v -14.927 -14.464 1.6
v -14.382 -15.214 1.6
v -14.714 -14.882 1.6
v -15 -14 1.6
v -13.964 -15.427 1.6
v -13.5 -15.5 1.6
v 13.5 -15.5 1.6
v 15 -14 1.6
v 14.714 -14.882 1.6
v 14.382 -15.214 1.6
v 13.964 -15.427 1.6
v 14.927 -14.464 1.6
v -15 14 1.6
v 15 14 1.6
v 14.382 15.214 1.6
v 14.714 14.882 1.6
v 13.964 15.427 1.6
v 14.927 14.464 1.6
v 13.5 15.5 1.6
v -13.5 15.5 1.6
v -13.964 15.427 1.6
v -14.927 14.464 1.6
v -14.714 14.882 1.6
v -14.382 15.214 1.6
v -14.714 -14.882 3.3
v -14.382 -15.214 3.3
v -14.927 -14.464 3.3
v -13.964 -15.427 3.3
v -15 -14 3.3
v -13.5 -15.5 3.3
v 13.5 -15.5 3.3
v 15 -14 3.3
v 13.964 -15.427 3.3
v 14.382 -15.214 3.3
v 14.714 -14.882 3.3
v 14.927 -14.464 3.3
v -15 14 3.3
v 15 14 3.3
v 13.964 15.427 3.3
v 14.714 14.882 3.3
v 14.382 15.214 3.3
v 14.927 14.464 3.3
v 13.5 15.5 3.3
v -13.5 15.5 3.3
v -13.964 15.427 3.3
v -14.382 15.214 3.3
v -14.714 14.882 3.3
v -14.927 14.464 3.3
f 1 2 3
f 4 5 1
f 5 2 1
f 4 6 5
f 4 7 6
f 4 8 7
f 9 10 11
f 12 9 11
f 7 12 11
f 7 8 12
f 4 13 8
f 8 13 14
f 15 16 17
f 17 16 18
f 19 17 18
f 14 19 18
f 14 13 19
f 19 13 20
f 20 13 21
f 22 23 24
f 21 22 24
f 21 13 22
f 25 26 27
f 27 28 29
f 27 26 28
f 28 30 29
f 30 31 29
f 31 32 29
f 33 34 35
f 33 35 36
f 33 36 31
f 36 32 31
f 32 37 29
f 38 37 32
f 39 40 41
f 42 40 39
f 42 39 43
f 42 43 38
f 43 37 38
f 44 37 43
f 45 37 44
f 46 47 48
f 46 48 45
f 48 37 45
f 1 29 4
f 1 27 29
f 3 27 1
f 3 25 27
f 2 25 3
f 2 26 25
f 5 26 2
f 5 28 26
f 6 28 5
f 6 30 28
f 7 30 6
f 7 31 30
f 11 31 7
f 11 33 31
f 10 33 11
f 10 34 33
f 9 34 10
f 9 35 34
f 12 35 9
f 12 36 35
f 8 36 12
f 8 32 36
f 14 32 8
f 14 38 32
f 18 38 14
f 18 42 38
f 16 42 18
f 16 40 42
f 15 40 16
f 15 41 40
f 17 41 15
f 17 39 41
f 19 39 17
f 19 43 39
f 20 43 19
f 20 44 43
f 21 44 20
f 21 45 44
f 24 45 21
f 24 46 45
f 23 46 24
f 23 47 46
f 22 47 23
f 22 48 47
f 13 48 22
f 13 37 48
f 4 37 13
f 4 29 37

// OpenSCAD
    $fn=20;
    
    baseDims=[30,31,1.7];
    rad=1.5;
    baseThck=1.7;
    baseZOffset=1.6;
    fudge=0.1;
    
    //base
    translate([0,0,baseZOffset]) linear_extrude(baseThck) 
      //difference(){
        hull() for (ix=[-1,1], iy=[-1,1])
          translate([ix*(baseDims.x/2-rad),iy*(baseDims.y/2-rad)]) circle(rad);
        //square([baseDims.x+fudge,opnWdth],true);
      //}
